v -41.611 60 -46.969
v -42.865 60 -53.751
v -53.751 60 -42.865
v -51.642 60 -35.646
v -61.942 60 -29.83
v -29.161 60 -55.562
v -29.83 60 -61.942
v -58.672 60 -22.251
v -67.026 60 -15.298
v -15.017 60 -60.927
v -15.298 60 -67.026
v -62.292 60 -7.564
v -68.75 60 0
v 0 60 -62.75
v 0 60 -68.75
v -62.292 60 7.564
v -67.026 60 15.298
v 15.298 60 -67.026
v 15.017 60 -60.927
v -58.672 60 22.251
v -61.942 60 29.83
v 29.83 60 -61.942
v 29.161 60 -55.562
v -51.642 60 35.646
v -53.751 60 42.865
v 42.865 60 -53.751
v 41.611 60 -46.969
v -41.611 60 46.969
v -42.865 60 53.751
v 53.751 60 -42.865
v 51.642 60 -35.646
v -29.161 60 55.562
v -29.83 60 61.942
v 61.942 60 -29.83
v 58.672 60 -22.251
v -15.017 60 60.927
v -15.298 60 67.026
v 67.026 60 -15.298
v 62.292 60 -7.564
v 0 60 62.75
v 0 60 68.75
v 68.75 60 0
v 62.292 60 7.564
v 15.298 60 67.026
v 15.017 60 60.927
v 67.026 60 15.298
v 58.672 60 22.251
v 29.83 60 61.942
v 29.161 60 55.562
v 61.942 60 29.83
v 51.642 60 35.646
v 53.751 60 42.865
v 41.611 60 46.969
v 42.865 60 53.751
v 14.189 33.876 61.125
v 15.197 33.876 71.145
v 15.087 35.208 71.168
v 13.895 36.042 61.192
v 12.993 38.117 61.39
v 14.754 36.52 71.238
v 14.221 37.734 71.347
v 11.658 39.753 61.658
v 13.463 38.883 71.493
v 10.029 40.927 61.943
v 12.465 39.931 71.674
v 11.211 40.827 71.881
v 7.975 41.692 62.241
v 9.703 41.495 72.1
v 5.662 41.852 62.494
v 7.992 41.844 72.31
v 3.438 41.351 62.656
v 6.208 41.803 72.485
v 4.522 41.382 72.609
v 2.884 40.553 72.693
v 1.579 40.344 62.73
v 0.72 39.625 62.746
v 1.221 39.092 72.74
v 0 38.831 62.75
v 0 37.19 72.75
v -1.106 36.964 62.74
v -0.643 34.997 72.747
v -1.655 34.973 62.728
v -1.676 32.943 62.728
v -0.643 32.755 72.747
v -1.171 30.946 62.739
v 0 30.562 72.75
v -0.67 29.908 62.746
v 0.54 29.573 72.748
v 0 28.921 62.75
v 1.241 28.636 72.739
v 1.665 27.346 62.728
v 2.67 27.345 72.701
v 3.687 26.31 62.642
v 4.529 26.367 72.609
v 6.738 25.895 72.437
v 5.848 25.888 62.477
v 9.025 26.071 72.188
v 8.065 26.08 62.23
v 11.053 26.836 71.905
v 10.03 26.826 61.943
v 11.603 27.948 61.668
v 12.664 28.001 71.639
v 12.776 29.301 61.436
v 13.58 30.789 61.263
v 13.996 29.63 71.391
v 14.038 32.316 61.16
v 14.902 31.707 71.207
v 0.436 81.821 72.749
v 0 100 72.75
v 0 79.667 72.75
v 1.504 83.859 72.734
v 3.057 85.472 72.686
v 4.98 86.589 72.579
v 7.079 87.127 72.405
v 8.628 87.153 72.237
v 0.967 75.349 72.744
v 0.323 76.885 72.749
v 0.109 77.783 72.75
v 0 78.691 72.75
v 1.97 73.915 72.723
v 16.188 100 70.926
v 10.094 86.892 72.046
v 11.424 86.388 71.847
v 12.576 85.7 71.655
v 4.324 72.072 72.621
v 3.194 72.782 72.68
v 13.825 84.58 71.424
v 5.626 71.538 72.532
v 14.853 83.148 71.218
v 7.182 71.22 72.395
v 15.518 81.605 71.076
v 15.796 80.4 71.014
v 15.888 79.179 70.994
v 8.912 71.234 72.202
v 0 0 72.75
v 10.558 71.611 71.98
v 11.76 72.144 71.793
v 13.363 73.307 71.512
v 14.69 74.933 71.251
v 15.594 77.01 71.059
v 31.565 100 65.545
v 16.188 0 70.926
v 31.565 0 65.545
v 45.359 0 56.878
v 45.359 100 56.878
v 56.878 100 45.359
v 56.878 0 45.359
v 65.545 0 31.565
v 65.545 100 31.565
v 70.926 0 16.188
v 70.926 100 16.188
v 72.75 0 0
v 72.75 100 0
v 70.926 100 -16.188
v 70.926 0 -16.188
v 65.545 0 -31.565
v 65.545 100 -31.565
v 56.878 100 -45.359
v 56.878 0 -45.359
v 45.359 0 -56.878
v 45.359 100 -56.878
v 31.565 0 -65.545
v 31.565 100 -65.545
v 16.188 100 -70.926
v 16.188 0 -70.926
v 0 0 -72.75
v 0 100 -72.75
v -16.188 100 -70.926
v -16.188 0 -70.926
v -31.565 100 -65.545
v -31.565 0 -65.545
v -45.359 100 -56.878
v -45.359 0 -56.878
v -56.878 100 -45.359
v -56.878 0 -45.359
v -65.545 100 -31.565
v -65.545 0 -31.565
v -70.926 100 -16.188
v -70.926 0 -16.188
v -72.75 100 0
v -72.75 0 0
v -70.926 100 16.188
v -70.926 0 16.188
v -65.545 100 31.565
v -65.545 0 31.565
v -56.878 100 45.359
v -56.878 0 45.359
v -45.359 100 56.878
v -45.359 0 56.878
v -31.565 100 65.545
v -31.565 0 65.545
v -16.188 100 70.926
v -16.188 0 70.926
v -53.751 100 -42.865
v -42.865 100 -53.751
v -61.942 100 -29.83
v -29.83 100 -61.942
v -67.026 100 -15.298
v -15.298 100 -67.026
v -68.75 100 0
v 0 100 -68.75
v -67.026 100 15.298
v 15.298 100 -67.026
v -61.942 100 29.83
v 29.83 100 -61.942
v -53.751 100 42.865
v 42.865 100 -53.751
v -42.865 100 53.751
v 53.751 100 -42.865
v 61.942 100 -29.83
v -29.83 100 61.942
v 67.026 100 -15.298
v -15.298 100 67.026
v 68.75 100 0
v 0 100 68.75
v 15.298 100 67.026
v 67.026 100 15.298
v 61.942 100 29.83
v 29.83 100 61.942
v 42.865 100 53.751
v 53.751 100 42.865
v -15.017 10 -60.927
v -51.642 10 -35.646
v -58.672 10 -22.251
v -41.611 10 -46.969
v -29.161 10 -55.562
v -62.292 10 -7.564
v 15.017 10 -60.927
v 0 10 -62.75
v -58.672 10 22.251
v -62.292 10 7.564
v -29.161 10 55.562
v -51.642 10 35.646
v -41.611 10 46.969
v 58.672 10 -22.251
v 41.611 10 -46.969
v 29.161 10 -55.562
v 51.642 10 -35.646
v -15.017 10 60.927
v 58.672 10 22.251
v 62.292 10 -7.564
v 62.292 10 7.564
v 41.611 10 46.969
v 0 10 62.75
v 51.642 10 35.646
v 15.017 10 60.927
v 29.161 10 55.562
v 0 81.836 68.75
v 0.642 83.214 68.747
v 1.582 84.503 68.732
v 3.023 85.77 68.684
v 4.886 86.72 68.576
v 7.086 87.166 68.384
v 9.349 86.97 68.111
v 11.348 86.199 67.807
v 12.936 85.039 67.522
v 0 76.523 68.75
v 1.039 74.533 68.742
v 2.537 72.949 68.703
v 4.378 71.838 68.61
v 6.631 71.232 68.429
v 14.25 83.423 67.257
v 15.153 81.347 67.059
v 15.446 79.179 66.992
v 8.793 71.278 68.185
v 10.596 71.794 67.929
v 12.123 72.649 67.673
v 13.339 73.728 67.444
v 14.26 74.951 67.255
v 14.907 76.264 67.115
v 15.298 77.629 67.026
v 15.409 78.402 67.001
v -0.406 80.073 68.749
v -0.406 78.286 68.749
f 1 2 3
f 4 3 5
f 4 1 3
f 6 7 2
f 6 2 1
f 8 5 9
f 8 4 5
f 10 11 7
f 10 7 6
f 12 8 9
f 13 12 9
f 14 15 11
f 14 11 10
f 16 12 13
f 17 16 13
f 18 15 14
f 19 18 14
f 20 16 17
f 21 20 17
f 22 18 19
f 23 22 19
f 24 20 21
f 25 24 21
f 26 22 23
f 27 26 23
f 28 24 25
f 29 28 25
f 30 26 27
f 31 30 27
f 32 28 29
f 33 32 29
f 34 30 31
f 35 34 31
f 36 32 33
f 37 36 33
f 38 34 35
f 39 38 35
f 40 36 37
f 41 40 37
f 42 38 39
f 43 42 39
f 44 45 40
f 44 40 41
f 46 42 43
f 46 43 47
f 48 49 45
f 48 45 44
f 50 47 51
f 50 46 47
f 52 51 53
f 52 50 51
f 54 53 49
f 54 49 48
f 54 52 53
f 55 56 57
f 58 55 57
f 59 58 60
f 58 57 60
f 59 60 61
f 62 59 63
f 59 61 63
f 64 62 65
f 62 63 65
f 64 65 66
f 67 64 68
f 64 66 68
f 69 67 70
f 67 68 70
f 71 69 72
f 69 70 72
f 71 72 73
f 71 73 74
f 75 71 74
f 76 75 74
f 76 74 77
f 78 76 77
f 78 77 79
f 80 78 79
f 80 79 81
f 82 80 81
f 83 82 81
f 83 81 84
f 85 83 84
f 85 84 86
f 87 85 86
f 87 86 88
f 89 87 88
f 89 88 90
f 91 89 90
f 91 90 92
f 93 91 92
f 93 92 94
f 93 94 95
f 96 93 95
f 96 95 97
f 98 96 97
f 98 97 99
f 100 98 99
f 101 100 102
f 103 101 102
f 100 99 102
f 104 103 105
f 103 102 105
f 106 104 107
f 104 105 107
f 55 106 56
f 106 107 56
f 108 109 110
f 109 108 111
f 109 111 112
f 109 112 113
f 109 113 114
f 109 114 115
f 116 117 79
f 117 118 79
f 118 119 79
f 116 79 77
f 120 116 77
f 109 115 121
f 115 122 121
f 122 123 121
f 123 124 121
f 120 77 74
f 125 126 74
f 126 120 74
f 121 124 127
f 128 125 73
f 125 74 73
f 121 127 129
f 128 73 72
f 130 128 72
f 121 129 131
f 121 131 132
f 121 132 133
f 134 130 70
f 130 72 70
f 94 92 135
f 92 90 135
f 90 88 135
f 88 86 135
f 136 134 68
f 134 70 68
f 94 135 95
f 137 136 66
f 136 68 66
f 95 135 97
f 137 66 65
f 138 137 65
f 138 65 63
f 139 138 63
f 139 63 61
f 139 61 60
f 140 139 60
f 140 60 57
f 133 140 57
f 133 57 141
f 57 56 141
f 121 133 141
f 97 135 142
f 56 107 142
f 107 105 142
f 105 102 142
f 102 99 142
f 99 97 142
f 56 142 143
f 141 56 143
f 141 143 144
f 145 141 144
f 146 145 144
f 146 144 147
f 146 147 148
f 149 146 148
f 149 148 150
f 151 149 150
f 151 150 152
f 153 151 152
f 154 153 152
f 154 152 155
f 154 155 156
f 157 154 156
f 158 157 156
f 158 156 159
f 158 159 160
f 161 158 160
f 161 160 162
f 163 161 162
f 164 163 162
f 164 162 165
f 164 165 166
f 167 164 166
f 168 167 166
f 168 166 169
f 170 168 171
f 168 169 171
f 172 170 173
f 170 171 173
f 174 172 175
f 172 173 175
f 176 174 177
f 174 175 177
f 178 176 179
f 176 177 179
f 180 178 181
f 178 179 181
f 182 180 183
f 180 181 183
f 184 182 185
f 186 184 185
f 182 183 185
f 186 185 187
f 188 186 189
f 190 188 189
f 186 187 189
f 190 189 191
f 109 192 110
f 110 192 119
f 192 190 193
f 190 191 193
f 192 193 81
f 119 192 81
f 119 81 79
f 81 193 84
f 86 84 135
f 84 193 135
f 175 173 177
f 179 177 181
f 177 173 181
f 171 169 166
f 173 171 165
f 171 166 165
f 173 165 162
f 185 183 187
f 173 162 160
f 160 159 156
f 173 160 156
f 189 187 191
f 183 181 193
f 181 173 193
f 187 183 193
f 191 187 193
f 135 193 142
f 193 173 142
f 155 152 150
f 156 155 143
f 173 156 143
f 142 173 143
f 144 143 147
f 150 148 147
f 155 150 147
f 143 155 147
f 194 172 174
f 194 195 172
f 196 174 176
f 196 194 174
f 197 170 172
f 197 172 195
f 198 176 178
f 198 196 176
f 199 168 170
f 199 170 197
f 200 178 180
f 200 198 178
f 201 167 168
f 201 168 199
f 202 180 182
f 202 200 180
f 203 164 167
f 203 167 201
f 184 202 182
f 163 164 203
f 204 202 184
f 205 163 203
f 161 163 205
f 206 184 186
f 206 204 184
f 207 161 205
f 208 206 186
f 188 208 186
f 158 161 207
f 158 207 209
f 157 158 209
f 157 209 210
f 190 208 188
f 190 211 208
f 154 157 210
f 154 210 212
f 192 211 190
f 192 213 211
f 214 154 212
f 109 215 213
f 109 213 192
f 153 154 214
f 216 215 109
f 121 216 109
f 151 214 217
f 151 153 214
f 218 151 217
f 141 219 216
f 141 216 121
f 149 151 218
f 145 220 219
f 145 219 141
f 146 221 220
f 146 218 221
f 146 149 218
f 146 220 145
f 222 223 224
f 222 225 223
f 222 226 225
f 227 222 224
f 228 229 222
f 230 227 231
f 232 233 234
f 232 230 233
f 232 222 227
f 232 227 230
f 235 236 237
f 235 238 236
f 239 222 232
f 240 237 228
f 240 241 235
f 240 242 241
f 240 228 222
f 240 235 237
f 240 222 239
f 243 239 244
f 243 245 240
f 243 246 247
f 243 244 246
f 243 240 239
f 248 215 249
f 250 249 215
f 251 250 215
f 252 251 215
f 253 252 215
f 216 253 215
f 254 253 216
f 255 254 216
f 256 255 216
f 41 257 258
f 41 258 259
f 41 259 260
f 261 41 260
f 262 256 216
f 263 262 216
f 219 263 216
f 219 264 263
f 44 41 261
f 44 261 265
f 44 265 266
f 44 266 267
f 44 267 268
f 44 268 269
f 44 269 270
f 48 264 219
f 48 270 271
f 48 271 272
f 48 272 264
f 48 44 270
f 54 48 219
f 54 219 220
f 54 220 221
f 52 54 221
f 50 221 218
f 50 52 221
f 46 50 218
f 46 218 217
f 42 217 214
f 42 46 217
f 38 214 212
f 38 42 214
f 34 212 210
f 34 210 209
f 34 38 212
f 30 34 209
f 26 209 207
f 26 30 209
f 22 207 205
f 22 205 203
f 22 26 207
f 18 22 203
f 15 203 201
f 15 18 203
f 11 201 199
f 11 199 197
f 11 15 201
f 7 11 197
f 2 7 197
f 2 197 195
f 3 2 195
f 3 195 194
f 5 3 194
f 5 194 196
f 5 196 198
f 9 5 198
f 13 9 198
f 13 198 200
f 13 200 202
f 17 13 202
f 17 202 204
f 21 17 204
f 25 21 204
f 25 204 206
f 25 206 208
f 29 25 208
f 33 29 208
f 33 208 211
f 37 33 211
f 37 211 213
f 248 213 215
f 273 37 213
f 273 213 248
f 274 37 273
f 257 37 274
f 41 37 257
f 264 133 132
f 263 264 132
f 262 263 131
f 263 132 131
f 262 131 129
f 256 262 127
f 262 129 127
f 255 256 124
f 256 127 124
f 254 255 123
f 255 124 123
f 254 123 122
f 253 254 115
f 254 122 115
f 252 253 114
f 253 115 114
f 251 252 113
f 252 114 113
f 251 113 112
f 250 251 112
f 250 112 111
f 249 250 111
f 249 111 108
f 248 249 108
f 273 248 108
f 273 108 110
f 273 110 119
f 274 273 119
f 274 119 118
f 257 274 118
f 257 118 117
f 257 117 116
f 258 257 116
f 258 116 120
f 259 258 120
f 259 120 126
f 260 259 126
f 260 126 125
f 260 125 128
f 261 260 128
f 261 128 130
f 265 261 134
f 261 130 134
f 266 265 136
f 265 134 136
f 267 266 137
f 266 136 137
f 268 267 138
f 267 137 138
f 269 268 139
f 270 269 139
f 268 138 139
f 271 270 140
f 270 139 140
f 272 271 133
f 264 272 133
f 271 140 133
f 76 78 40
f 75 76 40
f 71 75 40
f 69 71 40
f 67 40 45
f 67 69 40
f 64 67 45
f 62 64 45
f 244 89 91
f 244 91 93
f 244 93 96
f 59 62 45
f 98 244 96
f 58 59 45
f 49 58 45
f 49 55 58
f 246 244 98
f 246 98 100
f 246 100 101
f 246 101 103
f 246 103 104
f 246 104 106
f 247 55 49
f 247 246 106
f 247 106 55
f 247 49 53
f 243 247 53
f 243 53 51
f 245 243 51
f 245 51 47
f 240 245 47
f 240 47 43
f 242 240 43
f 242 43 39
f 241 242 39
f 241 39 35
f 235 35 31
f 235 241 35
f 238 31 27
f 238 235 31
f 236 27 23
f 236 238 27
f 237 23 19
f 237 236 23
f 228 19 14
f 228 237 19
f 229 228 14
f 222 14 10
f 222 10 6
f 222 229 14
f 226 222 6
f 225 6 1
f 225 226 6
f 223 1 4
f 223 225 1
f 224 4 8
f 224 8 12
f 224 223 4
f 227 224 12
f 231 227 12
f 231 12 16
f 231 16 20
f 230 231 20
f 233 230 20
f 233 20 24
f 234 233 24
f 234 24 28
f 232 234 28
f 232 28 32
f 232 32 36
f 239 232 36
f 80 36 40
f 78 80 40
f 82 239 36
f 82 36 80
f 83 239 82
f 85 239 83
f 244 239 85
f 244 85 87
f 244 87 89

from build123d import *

# Parameters (mm, degrees)
SKETCH_6_R                 = 72.75
EXTRUDE_16_DEPTH           = 100
SHELL_8_T                  = -10
CUT_EXTRUDE_START          = -40
SKETCH_13_R                = 68.75
SKETCH_13_R_2              = 62.75
CUT_EXTRUDE_5_DEPTH        = 40
F_16_0MM_2_REACH           = 180.442
F_16_0MM_2_BORE_R          = 8
F_16_0MM_2_ON_FACE_2_REACH = 185.929
F_16_0MM_2_BORE_2_R        = 8


with BuildPart() as part:
    # 草圖6 → 填料-伸長16 (new body)
    with BuildSketch(Plane(origin=(0, 0, 0), x_dir=(1, 0, 0), z_dir=(0, 1, 0))):
        with Locations(Location((0, 0, 0), (0, 0, 270))):
            Circle(SKETCH_6_R)
    extrude(amount=EXTRUDE_16_DEPTH)

    # 薄殼8
    shell_8_openings = [part.faces().sort_by_distance(p)[0] for p in [
        (0, 100, 0),
    ]]
    offset(amount=SHELL_8_T, openings=shell_8_openings, kind=Kind.INTERSECTION)

    # 草圖13 → 除料-伸長5 (cut)
    with BuildSketch(Plane(origin=(0, 100, 0), x_dir=(1, 0, 0), z_dir=(0, 1, 0)).offset(CUT_EXTRUDE_START)):
        with Locations(Location((0, 0, 0), (0, 0, 270))):
            Circle(SKETCH_13_R)
        with Locations(Location((0, 0, 0), (0, 0, 270))):
            Circle(SKETCH_13_R_2, mode=Mode.SUBTRACT)
    extrude(amount=CUT_EXTRUDE_5_DEPTH, mode=Mode.SUBTRACT)

    # Ø16.0mm 定位孔2 bore (on position points) → Ø16.0mm 定位孔2 (cut, up to next)
    with BuildSketch(Plane(origin=(7.281311378, 33.875955165, 72.384701454), x_dir=(0.994978714148, 0, -0.100086754332), z_dir=(0.100086754332, 0, 0.994978714148)), mode=Mode.PRIVATE) as f_16_0mm_2_sk1:
        Circle(F_16_0MM_2_BORE_R)
    f_16_0mm_2_tool1 = extrude(f_16_0mm_2_sk1.sketch, amount=-F_16_0MM_2_REACH, mode=Mode.PRIVATE) & part.part
    add(f_16_0mm_2_tool1.solids().sort_by_distance((7.281311, 33.875955, 72.384701))[0], mode=Mode.SUBTRACT)

    # Ø16.0mm 定位孔2 bore 2 (on position points) → Ø16.0mm 定位孔2 on face 2 (cut, up to next)
    with BuildSketch(Plane(origin=(7.98509872, 79.17918137, 72.310446676), x_dir=(0.993958008506, 0, -0.109761000939), z_dir=(0.109761000939, 0, 0.993958008506)), mode=Mode.PRIVATE) as f_16_0mm_2_on_face_2_sk1:
        Circle(F_16_0MM_2_BORE_2_R)
    f_16_0mm_2_on_face_2_tool1 = extrude(f_16_0mm_2_on_face_2_sk1.sketch, amount=-F_16_0MM_2_ON_FACE_2_REACH, mode=Mode.PRIVATE) & part.part
    add(f_16_0mm_2_on_face_2_tool1.solids().sort_by_distance((7.985099, 79.179181, 72.310447))[0], mode=Mode.SUBTRACT)


solid = part.part
